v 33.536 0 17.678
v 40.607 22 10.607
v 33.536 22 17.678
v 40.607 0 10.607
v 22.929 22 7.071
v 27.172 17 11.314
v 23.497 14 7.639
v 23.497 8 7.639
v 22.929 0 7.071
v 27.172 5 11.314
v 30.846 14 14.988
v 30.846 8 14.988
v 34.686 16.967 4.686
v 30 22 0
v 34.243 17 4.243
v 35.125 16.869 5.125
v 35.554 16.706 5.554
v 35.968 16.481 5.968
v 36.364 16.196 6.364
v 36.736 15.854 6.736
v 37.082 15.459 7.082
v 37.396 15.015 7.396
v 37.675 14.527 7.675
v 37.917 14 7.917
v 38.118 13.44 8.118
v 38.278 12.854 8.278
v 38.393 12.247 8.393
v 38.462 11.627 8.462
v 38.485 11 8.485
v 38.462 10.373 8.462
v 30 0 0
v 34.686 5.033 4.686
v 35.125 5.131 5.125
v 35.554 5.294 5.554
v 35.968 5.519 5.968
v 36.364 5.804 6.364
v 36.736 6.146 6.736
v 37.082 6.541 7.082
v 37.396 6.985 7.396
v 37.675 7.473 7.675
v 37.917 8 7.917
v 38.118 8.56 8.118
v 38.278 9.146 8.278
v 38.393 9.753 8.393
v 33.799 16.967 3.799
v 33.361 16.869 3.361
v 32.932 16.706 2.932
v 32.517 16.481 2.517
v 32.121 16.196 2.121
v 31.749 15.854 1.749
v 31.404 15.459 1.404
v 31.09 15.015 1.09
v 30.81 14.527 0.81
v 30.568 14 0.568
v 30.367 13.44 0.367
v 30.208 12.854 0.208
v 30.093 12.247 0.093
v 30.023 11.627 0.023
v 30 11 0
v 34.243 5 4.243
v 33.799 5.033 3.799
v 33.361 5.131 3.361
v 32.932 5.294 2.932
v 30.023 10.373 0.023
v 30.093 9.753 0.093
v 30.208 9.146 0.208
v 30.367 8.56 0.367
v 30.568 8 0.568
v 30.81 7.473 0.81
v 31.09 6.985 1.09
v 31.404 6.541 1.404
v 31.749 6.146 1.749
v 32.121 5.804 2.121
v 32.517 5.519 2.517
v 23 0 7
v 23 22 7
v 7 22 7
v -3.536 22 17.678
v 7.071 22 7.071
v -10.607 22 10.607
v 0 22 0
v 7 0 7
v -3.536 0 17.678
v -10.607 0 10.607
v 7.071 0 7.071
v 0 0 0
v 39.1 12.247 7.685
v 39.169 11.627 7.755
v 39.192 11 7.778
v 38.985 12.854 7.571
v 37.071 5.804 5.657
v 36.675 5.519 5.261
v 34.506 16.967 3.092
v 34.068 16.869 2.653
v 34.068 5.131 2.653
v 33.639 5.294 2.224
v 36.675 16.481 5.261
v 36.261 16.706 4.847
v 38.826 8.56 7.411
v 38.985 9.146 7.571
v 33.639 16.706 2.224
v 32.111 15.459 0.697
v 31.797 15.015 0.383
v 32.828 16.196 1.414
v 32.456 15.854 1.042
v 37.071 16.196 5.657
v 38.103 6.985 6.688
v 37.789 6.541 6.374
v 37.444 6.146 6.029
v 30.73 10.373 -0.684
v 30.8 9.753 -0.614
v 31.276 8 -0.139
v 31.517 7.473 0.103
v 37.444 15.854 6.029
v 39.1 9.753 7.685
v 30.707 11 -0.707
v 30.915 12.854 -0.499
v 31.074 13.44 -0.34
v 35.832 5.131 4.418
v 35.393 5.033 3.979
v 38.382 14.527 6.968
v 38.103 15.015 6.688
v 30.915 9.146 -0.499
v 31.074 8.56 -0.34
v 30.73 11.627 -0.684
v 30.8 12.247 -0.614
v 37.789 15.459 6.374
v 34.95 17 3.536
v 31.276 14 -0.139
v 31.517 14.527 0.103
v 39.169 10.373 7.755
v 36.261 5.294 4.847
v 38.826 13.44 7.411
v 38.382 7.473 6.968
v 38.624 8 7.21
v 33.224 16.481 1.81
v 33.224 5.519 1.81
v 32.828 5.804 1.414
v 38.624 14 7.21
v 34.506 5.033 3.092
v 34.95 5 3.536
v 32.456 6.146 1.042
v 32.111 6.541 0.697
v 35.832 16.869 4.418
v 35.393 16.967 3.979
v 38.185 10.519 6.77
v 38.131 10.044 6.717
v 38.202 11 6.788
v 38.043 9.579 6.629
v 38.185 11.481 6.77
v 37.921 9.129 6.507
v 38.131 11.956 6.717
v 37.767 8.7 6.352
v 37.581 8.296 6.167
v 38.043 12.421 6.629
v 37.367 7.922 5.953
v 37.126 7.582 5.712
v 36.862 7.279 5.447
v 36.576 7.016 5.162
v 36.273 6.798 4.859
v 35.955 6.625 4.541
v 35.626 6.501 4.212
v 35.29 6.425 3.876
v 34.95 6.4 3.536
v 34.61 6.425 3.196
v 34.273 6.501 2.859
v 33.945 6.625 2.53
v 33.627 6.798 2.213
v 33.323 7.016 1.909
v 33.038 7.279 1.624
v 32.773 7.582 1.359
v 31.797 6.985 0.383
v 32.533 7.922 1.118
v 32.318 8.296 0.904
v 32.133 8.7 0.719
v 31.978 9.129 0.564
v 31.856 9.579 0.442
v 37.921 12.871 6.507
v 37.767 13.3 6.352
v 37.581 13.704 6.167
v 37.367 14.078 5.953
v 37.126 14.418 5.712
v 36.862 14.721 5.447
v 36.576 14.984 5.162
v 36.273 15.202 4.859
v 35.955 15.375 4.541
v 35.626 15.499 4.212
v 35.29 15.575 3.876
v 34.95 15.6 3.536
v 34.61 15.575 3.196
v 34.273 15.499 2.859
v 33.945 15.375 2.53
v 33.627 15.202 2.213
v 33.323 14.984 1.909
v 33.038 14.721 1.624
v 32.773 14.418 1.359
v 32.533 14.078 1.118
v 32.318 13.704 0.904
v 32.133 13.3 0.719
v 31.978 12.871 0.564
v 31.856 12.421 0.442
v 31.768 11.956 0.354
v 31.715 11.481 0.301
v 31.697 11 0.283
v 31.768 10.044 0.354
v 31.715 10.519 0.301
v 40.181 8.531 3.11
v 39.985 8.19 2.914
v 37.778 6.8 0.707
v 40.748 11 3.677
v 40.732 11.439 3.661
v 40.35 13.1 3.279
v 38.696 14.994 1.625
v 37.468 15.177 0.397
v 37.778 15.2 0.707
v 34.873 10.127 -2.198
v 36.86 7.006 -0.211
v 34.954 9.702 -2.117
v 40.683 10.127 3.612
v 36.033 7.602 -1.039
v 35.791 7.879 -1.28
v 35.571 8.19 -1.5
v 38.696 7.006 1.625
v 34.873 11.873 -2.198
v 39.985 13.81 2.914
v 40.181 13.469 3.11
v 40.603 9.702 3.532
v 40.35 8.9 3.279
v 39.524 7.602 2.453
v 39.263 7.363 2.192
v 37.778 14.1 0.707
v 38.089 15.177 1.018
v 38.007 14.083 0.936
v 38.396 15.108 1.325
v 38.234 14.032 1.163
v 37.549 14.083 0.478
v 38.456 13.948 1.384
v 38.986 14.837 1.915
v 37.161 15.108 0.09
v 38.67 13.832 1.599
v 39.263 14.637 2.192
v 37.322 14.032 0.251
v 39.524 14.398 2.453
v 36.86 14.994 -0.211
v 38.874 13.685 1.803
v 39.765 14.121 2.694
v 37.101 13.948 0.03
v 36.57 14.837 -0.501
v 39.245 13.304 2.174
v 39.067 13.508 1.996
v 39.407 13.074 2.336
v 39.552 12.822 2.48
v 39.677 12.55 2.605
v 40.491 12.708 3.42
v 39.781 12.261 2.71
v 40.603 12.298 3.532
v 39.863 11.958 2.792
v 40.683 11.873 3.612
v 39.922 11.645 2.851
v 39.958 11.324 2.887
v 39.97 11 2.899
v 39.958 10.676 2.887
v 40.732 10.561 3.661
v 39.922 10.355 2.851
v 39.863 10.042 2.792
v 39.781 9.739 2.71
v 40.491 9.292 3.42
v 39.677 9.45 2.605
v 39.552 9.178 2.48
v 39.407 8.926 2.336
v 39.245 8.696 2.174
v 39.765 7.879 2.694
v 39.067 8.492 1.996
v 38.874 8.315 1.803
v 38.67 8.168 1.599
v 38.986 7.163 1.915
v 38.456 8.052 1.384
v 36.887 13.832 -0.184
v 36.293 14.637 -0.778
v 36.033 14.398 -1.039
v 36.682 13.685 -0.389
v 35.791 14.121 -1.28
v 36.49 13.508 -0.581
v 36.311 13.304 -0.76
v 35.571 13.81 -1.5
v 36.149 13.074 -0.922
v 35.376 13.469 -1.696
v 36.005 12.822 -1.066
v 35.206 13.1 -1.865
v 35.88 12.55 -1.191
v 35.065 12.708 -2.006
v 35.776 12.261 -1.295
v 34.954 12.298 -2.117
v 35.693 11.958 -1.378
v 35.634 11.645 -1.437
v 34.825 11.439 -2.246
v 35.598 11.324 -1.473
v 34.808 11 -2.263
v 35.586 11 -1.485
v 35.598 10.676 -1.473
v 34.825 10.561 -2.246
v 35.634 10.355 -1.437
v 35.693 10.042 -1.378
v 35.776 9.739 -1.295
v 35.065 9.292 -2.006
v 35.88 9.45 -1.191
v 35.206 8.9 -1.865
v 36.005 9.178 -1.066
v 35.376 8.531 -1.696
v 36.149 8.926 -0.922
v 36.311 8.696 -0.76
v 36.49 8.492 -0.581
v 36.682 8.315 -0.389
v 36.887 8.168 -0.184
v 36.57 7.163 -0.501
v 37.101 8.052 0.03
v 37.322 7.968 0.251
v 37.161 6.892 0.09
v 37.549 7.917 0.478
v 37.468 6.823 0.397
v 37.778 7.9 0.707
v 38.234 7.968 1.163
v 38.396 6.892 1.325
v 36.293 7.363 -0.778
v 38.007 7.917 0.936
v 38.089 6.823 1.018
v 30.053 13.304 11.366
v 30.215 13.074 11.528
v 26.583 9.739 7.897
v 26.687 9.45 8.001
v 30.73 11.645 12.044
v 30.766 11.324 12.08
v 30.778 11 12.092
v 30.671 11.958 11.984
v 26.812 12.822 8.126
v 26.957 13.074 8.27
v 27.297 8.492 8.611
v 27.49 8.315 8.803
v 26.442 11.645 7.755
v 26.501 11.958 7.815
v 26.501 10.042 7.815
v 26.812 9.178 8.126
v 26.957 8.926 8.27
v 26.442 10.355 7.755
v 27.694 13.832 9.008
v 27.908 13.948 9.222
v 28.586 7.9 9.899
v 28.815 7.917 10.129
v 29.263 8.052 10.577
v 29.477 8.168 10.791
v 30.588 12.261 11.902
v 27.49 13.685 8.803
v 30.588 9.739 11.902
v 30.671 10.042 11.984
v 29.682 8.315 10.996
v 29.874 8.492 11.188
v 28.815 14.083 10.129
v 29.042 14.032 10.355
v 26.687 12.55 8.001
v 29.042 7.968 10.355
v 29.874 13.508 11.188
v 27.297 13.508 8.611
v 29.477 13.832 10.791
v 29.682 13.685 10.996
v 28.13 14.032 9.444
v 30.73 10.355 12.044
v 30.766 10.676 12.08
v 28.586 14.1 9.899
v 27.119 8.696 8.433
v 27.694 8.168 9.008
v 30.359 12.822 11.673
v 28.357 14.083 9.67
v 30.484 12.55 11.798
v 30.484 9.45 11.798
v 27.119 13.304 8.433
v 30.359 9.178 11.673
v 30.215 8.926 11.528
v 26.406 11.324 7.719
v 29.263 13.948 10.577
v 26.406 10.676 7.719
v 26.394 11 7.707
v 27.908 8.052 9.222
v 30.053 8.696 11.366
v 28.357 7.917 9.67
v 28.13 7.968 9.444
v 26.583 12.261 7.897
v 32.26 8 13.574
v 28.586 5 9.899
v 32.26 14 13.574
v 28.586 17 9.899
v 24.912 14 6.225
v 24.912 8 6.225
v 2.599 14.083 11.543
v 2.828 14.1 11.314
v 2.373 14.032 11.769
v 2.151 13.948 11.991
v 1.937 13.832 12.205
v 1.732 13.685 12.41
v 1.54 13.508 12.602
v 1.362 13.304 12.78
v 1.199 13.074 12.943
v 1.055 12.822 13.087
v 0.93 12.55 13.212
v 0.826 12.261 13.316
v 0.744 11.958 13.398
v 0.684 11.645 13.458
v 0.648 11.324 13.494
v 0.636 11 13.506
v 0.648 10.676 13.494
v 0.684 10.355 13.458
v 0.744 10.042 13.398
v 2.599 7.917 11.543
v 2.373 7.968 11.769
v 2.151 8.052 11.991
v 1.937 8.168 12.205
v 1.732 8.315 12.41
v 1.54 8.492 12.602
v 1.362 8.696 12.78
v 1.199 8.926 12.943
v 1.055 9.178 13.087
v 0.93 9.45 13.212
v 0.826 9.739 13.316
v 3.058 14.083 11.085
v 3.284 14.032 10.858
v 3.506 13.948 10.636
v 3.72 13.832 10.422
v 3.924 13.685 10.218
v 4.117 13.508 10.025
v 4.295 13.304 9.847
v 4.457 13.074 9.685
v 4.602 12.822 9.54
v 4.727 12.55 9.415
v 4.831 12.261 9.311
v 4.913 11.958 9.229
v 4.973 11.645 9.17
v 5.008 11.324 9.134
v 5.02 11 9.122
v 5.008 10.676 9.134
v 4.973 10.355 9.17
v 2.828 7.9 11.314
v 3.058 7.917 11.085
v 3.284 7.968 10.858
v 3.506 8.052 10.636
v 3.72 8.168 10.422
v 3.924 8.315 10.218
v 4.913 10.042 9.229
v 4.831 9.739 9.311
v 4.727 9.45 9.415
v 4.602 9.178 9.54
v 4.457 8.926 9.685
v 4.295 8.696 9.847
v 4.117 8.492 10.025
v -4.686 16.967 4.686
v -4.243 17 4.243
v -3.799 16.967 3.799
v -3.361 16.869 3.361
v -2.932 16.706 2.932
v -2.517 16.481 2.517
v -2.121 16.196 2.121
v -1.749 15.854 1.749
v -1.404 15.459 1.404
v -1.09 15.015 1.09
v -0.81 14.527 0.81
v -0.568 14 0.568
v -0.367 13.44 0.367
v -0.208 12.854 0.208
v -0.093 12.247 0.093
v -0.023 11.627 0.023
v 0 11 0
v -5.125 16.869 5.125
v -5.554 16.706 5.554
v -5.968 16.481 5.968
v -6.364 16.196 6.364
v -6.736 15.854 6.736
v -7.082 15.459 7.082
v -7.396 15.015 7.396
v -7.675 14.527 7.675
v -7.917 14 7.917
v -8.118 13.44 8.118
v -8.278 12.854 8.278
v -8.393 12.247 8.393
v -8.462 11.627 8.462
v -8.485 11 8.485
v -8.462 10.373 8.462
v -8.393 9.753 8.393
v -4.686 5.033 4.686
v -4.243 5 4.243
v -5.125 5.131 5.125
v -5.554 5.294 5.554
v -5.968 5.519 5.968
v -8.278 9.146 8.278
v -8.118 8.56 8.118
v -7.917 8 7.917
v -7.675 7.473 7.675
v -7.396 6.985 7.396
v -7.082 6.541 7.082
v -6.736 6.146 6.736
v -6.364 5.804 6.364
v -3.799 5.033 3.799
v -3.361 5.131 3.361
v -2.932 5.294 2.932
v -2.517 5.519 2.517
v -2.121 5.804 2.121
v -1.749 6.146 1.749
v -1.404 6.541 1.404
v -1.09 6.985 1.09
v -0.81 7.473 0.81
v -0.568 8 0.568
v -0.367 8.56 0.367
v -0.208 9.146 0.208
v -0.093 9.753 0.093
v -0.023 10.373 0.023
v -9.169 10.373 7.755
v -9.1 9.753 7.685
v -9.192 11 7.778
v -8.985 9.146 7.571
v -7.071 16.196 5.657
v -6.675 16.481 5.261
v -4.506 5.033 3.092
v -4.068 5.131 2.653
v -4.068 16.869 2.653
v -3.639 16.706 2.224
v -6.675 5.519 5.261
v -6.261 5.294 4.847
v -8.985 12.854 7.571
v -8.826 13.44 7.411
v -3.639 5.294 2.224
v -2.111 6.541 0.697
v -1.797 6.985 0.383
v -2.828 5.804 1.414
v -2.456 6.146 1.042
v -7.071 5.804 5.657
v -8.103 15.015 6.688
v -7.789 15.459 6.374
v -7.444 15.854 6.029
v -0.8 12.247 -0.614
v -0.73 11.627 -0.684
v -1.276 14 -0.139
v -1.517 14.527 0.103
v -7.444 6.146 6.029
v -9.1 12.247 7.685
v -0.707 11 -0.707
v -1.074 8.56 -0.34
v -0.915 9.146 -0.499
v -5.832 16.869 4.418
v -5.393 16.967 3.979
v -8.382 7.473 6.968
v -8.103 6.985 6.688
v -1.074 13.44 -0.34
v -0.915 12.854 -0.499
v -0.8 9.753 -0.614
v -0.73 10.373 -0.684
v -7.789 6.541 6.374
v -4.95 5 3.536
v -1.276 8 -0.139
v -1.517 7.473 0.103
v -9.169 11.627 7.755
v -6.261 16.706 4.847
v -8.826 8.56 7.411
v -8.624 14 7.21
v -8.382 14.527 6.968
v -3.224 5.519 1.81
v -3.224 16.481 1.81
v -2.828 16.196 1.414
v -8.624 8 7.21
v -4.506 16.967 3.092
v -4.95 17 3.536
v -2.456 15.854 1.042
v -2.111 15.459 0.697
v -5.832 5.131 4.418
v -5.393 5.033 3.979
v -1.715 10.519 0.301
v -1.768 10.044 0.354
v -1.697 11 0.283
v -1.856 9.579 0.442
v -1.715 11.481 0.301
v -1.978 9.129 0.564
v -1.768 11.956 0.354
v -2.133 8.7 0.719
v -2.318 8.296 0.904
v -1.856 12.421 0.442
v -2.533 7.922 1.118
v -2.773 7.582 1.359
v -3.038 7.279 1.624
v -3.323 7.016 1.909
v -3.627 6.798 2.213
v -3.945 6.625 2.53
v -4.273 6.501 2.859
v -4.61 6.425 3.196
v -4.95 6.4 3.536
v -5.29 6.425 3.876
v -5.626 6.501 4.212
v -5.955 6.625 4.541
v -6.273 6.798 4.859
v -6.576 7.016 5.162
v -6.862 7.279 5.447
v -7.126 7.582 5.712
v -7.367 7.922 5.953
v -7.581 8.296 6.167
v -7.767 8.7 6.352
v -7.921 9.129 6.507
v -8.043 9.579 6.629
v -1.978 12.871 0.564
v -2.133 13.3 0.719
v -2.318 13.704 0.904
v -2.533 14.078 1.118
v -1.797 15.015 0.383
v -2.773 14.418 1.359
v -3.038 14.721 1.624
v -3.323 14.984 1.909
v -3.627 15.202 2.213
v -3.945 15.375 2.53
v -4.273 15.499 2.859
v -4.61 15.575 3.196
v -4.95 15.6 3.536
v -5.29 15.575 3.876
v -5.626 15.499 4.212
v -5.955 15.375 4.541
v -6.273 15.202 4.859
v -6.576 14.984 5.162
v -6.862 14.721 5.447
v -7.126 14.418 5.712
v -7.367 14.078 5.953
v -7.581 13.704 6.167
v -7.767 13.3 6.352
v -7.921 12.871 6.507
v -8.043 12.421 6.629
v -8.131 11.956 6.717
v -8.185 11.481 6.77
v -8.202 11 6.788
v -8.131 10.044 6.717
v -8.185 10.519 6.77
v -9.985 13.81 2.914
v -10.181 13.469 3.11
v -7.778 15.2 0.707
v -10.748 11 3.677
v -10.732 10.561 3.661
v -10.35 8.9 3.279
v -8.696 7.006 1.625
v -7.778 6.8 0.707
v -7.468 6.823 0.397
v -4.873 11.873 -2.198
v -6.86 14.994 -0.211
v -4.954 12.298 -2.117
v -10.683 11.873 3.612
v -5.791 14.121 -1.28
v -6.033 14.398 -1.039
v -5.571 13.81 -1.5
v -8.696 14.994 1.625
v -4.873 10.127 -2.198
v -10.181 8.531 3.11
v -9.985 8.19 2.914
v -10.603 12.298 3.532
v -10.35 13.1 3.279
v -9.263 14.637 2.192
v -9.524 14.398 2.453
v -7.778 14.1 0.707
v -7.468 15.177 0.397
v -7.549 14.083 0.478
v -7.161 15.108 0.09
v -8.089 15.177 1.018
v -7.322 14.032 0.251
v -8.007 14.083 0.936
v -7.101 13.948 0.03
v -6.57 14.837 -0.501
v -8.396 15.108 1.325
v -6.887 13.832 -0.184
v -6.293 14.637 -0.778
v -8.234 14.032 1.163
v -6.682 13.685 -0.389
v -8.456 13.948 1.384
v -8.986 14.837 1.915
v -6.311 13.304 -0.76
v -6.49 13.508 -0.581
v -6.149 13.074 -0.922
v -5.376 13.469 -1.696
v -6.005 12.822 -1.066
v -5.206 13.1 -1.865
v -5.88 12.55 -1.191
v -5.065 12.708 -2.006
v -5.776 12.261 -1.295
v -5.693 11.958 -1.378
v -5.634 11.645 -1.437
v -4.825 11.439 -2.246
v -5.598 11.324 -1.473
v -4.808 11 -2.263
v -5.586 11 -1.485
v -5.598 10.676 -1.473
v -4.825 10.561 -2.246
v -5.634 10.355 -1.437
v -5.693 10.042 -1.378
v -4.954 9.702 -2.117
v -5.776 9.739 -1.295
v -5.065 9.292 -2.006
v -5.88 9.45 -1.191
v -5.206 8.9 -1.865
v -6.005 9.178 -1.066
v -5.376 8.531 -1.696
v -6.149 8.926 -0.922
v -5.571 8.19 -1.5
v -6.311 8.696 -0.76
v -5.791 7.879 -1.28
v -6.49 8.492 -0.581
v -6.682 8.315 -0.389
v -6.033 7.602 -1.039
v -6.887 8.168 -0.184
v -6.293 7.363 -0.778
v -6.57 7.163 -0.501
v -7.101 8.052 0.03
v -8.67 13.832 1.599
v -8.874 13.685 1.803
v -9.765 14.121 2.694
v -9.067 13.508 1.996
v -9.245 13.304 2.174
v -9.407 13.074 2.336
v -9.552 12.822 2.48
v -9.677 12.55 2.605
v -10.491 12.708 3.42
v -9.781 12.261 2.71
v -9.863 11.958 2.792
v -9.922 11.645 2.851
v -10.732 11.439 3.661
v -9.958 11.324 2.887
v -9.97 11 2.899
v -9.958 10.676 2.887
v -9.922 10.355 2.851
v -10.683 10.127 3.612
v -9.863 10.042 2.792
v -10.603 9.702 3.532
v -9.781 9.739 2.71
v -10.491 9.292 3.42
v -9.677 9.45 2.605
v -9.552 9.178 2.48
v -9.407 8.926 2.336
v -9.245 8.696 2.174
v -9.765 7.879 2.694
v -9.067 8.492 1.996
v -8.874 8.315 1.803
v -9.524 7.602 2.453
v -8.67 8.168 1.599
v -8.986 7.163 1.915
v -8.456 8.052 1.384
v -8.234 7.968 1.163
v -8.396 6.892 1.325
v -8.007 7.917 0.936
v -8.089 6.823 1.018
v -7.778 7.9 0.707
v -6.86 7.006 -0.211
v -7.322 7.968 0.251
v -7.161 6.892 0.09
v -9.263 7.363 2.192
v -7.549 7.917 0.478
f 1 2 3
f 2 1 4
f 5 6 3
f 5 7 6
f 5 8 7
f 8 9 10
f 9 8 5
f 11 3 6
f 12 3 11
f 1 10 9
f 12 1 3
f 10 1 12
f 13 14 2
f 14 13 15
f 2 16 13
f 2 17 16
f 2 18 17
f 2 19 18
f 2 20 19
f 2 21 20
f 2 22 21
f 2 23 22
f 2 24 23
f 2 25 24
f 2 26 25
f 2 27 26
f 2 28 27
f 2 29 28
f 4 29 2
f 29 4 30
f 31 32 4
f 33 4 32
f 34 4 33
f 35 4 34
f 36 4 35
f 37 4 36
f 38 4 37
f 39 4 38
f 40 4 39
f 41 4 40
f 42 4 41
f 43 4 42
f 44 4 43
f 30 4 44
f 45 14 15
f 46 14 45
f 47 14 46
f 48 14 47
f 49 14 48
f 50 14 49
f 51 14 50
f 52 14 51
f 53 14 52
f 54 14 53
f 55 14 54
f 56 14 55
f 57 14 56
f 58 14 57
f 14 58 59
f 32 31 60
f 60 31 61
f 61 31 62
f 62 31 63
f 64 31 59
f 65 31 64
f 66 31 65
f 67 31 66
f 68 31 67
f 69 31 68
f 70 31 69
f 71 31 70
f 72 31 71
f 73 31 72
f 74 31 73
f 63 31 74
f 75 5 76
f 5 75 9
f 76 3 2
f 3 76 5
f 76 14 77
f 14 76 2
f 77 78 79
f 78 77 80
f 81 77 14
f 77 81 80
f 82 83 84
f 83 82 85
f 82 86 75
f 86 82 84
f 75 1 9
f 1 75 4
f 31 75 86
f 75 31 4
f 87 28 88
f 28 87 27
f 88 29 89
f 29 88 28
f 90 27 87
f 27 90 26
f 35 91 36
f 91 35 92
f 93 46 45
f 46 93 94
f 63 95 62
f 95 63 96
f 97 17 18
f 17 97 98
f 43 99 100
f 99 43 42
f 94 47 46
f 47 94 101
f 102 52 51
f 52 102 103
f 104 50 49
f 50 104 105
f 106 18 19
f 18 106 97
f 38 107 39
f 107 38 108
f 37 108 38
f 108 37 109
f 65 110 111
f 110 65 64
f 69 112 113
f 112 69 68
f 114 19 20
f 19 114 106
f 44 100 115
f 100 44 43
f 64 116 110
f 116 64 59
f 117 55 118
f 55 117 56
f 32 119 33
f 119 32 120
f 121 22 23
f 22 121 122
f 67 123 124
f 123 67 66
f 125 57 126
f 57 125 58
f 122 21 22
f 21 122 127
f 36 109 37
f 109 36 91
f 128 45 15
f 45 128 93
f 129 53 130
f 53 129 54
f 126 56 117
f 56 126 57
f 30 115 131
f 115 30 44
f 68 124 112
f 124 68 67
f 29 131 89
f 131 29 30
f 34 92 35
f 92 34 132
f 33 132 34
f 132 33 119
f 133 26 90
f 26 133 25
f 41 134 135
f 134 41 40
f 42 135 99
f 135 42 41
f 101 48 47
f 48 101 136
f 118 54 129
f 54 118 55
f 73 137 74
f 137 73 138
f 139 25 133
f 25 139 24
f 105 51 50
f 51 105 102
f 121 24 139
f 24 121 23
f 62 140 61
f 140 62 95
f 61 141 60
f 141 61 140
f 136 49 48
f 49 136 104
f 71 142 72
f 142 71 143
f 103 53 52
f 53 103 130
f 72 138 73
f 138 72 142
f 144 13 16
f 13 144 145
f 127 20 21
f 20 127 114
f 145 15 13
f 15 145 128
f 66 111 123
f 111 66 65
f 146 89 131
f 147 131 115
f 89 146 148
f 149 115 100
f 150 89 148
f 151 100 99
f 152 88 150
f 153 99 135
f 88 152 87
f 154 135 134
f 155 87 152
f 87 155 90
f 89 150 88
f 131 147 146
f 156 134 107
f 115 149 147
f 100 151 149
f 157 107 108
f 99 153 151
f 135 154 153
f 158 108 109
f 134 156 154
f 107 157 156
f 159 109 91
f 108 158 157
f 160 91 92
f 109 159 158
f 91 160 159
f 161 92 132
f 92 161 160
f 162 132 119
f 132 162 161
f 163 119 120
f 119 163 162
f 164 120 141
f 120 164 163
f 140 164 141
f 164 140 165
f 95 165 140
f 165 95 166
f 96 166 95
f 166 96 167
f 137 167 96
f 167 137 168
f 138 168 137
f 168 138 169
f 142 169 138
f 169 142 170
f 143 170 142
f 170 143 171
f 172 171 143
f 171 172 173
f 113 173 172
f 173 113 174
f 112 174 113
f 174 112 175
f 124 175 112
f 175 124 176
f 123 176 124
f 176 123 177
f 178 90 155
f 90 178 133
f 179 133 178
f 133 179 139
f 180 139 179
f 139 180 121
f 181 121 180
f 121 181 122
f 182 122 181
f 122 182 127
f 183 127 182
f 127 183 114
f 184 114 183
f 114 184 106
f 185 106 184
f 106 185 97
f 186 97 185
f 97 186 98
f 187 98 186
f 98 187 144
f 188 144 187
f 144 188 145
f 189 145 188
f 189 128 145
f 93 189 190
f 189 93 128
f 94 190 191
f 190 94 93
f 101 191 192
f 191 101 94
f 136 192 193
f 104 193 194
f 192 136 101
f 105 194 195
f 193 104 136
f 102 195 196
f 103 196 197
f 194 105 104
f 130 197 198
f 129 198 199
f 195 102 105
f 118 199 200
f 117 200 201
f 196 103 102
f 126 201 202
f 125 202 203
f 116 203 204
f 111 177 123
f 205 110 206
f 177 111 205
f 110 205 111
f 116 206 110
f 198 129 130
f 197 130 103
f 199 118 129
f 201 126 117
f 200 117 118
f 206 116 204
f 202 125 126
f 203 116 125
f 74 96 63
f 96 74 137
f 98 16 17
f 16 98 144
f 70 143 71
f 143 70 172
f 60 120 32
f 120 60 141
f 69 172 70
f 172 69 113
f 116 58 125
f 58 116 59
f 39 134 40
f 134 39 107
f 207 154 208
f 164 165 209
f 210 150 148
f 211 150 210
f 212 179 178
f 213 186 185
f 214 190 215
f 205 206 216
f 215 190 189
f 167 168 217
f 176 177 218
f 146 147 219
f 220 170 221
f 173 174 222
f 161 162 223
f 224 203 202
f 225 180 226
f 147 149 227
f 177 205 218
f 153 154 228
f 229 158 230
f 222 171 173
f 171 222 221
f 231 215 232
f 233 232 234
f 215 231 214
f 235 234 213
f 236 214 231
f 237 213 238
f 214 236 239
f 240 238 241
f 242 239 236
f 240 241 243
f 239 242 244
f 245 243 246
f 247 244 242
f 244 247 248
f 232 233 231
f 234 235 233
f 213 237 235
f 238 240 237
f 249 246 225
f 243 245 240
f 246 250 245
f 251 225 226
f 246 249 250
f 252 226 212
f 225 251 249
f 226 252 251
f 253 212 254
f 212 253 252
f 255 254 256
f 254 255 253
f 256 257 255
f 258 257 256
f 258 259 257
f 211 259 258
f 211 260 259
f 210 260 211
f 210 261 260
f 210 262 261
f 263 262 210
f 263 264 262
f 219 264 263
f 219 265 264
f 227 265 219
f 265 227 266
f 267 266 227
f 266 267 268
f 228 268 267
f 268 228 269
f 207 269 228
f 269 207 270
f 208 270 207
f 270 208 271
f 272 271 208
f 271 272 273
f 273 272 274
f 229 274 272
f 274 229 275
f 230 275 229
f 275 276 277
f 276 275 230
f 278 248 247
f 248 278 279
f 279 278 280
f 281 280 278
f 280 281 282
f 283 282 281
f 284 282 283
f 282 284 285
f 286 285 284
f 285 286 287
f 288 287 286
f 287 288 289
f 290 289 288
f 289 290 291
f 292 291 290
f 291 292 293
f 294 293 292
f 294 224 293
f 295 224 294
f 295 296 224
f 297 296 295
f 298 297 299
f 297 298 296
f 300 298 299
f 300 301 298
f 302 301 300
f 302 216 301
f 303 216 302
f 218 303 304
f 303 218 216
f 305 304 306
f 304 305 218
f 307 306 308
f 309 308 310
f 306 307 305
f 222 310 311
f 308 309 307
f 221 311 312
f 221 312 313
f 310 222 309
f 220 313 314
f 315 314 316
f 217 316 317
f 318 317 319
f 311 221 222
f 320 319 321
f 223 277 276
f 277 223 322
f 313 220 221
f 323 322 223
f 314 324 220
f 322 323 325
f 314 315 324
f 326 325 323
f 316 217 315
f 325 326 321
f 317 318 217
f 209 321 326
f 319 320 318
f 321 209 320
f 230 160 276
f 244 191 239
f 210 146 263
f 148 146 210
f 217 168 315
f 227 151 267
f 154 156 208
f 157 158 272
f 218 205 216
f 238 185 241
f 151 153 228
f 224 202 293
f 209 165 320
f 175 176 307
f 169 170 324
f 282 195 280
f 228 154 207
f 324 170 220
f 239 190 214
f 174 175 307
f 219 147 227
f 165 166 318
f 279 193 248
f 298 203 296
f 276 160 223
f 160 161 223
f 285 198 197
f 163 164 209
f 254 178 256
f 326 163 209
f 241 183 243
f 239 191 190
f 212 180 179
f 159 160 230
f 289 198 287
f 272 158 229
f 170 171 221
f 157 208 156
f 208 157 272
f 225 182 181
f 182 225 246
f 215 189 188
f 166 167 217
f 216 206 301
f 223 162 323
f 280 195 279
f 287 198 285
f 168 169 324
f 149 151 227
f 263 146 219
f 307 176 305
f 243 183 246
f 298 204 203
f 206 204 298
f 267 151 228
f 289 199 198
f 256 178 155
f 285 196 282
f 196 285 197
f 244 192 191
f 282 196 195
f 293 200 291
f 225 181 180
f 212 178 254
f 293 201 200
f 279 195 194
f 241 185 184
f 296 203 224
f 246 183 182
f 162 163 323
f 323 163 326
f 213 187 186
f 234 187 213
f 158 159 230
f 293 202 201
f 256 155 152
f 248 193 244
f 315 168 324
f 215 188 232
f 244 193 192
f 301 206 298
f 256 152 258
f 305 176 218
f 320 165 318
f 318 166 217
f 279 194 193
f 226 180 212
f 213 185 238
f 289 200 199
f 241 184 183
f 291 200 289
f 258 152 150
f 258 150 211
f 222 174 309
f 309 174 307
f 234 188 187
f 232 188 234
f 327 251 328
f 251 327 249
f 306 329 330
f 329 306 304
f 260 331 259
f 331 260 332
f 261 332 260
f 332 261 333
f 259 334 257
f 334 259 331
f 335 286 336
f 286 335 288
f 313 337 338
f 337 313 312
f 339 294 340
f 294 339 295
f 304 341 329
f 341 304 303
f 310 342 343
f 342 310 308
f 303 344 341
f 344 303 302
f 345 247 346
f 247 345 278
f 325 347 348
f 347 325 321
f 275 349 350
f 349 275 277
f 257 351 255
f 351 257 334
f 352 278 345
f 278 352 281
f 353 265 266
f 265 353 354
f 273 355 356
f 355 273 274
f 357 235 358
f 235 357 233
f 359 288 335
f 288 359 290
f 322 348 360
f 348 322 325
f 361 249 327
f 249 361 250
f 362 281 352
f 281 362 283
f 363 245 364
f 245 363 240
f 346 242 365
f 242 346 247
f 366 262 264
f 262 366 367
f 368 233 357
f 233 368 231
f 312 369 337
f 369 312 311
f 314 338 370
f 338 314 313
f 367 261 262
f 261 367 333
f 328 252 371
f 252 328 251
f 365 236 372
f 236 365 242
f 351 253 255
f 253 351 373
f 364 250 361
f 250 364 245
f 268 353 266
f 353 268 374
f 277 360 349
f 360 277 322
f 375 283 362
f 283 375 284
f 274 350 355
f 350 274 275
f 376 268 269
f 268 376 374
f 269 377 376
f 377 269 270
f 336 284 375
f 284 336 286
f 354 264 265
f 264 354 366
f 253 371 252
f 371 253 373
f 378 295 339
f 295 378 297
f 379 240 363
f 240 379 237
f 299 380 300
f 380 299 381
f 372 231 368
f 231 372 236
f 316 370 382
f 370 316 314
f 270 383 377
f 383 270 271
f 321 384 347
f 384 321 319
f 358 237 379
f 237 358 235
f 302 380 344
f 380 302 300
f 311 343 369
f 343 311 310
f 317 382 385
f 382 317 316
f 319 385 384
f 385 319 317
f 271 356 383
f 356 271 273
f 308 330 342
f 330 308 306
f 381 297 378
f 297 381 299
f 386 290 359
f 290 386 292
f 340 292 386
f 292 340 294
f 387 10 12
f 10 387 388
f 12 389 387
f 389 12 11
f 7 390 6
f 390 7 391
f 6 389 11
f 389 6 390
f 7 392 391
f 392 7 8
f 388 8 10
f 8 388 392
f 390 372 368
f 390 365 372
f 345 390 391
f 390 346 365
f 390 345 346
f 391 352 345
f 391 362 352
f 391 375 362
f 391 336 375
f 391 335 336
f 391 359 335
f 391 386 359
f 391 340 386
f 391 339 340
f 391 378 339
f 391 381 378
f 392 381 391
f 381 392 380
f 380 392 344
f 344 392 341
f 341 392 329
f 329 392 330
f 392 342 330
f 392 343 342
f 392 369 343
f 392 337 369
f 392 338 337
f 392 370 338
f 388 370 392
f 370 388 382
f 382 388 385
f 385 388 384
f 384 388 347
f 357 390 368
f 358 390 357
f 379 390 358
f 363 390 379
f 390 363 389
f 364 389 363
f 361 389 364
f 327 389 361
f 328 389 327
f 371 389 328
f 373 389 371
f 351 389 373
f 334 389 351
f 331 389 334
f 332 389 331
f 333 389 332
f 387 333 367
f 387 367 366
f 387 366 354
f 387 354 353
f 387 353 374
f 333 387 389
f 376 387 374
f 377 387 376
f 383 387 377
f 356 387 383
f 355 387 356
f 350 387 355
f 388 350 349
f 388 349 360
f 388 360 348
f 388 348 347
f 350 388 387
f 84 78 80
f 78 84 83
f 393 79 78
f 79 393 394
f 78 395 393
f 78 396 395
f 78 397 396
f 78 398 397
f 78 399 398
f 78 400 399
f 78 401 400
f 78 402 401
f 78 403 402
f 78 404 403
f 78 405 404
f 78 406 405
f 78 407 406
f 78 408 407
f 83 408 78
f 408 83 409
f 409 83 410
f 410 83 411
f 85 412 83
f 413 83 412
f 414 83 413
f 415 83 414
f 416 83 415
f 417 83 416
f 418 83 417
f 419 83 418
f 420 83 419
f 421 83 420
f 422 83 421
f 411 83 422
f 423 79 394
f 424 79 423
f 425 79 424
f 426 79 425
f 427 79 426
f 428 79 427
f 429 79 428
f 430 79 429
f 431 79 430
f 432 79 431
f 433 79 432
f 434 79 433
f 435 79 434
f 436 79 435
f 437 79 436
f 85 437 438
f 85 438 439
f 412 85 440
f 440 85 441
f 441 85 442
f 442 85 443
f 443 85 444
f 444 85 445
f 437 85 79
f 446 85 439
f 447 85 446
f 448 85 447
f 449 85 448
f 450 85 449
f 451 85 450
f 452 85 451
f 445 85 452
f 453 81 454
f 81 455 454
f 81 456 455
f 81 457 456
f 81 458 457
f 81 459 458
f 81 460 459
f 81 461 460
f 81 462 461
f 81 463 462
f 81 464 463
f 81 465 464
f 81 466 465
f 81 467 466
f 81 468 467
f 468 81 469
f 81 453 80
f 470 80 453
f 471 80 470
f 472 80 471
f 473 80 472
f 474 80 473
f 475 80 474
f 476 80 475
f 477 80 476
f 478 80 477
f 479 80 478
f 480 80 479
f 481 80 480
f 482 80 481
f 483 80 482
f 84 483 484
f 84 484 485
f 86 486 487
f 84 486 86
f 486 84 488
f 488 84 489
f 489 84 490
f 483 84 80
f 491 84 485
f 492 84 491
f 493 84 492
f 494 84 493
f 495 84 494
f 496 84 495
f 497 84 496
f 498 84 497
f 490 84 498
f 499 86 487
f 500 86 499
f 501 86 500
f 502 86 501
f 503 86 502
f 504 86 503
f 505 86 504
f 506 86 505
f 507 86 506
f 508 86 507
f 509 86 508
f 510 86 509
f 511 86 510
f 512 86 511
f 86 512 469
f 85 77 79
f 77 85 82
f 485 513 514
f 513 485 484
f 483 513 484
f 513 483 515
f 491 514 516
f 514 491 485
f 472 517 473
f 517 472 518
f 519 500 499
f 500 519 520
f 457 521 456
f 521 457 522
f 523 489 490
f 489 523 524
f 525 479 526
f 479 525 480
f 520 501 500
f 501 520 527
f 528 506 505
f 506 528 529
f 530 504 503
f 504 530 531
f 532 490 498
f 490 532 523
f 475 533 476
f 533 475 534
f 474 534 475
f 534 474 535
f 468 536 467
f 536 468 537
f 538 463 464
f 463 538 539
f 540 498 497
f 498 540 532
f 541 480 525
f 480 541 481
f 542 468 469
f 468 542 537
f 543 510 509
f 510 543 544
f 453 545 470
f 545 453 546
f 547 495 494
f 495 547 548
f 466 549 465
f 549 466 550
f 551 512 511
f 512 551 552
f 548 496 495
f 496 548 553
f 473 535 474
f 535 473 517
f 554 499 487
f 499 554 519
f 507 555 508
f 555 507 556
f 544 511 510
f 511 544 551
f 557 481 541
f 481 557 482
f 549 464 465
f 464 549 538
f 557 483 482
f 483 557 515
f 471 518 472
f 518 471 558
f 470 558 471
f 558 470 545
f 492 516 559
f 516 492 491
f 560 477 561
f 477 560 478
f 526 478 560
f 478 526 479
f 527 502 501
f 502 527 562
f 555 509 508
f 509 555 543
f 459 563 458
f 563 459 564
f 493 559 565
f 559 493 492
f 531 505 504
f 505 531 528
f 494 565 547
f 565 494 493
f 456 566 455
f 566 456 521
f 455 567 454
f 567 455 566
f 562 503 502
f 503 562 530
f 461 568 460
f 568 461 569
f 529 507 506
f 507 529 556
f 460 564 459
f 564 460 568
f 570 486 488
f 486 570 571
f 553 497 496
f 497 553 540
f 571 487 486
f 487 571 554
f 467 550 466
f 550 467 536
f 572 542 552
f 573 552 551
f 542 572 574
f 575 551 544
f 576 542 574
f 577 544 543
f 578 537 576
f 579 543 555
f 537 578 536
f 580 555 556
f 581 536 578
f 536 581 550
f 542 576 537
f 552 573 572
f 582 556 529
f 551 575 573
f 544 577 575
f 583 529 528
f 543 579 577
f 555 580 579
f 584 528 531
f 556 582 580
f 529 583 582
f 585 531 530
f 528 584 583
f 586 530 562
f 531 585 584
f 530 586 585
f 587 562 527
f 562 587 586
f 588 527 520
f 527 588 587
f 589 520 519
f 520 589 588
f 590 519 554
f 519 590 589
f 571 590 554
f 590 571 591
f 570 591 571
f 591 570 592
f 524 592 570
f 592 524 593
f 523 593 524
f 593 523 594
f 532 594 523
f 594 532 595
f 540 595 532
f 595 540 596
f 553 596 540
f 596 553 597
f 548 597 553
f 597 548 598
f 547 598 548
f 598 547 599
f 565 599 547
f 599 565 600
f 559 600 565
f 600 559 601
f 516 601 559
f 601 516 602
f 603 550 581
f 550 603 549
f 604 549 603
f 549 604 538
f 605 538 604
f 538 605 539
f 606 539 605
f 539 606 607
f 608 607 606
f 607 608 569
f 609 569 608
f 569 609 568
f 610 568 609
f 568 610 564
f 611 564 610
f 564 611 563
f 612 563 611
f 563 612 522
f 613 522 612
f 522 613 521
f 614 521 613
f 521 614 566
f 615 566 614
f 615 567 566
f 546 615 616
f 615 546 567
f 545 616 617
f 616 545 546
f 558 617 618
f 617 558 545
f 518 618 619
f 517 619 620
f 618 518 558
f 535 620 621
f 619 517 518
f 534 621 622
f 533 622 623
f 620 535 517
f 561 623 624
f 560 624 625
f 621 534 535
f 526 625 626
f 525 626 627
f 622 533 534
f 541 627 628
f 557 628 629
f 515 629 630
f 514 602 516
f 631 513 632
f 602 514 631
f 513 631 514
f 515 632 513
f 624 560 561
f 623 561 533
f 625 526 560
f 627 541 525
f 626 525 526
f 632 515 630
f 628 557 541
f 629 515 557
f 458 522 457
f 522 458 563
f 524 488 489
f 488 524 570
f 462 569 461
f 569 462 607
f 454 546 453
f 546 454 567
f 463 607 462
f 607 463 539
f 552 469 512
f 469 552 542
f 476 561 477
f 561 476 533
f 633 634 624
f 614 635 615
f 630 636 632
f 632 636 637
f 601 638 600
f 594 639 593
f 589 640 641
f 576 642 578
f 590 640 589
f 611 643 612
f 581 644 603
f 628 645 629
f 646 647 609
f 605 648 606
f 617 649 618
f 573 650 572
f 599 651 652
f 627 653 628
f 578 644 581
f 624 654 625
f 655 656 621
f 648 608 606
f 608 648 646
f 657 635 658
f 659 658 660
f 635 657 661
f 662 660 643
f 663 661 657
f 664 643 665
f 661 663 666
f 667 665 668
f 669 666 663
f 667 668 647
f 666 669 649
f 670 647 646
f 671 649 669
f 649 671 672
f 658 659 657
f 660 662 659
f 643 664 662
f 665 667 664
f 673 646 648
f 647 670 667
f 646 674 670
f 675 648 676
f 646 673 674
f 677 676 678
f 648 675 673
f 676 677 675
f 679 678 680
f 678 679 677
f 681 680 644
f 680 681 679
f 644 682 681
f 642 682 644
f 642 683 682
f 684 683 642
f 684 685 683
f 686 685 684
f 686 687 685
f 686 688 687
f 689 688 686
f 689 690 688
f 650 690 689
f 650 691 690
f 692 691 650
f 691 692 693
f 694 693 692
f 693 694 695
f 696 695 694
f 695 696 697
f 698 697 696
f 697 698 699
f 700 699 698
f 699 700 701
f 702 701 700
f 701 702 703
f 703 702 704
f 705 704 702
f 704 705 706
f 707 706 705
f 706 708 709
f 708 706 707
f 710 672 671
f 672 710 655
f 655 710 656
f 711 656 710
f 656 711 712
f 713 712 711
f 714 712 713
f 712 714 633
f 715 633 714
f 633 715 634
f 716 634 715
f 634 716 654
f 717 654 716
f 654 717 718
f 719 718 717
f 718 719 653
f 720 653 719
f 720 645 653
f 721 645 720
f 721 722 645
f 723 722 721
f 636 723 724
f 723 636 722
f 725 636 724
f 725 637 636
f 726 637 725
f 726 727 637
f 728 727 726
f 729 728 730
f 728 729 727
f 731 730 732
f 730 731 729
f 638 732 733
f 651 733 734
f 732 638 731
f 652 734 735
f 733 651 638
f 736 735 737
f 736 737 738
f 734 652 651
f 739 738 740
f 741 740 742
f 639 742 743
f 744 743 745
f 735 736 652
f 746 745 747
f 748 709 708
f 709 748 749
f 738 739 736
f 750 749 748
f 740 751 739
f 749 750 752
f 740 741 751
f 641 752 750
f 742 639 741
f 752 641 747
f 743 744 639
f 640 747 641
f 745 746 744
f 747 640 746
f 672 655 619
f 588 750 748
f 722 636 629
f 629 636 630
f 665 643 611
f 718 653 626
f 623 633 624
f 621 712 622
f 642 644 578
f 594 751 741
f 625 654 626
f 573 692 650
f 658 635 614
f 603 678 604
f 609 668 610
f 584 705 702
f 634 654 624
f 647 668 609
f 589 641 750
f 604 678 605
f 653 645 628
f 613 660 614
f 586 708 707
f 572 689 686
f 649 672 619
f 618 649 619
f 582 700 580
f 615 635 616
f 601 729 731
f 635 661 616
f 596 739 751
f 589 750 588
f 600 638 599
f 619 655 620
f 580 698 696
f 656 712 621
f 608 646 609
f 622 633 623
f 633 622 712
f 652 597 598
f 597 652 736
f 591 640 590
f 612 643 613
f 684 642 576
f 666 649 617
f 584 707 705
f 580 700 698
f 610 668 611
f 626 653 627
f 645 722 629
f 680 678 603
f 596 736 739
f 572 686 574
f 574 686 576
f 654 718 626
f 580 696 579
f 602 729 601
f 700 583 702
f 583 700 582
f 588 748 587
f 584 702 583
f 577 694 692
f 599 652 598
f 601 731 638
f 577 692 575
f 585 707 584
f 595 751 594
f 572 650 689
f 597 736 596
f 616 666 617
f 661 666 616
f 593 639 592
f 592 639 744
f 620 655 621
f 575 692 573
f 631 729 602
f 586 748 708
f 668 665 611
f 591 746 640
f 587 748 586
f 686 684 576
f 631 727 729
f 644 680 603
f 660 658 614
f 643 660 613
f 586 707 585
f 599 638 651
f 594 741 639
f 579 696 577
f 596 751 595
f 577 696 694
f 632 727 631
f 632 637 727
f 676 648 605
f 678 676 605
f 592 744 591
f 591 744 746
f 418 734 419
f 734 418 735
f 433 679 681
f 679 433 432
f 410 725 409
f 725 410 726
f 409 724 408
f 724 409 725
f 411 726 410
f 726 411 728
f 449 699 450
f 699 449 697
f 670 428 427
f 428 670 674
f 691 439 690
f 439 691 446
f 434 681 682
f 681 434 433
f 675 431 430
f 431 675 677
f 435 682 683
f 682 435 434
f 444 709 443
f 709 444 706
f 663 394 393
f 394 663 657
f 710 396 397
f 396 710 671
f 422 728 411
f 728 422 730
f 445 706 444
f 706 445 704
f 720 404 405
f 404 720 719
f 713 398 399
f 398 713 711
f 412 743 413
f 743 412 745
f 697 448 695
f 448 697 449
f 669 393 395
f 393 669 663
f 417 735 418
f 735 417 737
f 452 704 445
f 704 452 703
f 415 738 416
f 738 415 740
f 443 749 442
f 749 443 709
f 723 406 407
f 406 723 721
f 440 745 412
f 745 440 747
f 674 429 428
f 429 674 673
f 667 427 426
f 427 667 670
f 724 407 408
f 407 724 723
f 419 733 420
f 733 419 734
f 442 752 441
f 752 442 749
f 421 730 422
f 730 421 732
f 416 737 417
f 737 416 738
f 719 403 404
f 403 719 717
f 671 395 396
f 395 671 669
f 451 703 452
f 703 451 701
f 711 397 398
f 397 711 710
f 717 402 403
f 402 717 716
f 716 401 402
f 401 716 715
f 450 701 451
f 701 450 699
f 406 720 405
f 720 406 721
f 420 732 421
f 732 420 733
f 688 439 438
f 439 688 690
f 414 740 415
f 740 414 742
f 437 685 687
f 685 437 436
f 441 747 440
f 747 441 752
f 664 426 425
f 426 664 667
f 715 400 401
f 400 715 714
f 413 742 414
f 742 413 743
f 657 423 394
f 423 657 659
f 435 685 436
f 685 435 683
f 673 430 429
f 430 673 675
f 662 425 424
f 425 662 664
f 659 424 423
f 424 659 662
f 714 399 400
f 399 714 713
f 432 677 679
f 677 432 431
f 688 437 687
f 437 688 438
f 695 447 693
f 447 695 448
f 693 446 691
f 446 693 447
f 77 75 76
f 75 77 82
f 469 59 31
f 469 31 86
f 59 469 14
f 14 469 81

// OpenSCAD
//////////////DICHIARAZIONI///////////////////////

//flange width
L=30;
// Element width
Sp=22;
// Roundness
$fn=60; 

////////////////////


module angolare()
difference()
{
union()
{
cube([15,Sp,10]);
translate([6,Sp/2,-1])cylinder(2,6,6);
translate([6,Sp/2,-5])cylinder(4,4.2,4.6);

}
translate([6,Sp/2,-6])cylinder(17,3.1,3.1);
translate([6,Sp/2,8])rotate([0,0,30])cylinder(4,6,6,$fn=6);
}
module angolare1()
difference()
{
union()
{
cube([15,Sp,10]);
translate([6,Sp/2,-1])cylinder(2,6,6);
translate([6,Sp/2,-5])cylinder(4,4.2,4.6);

}
translate([6,Sp/2,-6])cylinder(17,3.1,3.1);
}

translate([L,0,0])rotate([0,-45,0])angolare();
translate([0,Sp,0])rotate([0,-45,180])angolare1();


hull()//corpo centrale
{
cube([L,Sp,1]);
translate([7,0,6])cube([L/2+1,Sp,1]);
}
